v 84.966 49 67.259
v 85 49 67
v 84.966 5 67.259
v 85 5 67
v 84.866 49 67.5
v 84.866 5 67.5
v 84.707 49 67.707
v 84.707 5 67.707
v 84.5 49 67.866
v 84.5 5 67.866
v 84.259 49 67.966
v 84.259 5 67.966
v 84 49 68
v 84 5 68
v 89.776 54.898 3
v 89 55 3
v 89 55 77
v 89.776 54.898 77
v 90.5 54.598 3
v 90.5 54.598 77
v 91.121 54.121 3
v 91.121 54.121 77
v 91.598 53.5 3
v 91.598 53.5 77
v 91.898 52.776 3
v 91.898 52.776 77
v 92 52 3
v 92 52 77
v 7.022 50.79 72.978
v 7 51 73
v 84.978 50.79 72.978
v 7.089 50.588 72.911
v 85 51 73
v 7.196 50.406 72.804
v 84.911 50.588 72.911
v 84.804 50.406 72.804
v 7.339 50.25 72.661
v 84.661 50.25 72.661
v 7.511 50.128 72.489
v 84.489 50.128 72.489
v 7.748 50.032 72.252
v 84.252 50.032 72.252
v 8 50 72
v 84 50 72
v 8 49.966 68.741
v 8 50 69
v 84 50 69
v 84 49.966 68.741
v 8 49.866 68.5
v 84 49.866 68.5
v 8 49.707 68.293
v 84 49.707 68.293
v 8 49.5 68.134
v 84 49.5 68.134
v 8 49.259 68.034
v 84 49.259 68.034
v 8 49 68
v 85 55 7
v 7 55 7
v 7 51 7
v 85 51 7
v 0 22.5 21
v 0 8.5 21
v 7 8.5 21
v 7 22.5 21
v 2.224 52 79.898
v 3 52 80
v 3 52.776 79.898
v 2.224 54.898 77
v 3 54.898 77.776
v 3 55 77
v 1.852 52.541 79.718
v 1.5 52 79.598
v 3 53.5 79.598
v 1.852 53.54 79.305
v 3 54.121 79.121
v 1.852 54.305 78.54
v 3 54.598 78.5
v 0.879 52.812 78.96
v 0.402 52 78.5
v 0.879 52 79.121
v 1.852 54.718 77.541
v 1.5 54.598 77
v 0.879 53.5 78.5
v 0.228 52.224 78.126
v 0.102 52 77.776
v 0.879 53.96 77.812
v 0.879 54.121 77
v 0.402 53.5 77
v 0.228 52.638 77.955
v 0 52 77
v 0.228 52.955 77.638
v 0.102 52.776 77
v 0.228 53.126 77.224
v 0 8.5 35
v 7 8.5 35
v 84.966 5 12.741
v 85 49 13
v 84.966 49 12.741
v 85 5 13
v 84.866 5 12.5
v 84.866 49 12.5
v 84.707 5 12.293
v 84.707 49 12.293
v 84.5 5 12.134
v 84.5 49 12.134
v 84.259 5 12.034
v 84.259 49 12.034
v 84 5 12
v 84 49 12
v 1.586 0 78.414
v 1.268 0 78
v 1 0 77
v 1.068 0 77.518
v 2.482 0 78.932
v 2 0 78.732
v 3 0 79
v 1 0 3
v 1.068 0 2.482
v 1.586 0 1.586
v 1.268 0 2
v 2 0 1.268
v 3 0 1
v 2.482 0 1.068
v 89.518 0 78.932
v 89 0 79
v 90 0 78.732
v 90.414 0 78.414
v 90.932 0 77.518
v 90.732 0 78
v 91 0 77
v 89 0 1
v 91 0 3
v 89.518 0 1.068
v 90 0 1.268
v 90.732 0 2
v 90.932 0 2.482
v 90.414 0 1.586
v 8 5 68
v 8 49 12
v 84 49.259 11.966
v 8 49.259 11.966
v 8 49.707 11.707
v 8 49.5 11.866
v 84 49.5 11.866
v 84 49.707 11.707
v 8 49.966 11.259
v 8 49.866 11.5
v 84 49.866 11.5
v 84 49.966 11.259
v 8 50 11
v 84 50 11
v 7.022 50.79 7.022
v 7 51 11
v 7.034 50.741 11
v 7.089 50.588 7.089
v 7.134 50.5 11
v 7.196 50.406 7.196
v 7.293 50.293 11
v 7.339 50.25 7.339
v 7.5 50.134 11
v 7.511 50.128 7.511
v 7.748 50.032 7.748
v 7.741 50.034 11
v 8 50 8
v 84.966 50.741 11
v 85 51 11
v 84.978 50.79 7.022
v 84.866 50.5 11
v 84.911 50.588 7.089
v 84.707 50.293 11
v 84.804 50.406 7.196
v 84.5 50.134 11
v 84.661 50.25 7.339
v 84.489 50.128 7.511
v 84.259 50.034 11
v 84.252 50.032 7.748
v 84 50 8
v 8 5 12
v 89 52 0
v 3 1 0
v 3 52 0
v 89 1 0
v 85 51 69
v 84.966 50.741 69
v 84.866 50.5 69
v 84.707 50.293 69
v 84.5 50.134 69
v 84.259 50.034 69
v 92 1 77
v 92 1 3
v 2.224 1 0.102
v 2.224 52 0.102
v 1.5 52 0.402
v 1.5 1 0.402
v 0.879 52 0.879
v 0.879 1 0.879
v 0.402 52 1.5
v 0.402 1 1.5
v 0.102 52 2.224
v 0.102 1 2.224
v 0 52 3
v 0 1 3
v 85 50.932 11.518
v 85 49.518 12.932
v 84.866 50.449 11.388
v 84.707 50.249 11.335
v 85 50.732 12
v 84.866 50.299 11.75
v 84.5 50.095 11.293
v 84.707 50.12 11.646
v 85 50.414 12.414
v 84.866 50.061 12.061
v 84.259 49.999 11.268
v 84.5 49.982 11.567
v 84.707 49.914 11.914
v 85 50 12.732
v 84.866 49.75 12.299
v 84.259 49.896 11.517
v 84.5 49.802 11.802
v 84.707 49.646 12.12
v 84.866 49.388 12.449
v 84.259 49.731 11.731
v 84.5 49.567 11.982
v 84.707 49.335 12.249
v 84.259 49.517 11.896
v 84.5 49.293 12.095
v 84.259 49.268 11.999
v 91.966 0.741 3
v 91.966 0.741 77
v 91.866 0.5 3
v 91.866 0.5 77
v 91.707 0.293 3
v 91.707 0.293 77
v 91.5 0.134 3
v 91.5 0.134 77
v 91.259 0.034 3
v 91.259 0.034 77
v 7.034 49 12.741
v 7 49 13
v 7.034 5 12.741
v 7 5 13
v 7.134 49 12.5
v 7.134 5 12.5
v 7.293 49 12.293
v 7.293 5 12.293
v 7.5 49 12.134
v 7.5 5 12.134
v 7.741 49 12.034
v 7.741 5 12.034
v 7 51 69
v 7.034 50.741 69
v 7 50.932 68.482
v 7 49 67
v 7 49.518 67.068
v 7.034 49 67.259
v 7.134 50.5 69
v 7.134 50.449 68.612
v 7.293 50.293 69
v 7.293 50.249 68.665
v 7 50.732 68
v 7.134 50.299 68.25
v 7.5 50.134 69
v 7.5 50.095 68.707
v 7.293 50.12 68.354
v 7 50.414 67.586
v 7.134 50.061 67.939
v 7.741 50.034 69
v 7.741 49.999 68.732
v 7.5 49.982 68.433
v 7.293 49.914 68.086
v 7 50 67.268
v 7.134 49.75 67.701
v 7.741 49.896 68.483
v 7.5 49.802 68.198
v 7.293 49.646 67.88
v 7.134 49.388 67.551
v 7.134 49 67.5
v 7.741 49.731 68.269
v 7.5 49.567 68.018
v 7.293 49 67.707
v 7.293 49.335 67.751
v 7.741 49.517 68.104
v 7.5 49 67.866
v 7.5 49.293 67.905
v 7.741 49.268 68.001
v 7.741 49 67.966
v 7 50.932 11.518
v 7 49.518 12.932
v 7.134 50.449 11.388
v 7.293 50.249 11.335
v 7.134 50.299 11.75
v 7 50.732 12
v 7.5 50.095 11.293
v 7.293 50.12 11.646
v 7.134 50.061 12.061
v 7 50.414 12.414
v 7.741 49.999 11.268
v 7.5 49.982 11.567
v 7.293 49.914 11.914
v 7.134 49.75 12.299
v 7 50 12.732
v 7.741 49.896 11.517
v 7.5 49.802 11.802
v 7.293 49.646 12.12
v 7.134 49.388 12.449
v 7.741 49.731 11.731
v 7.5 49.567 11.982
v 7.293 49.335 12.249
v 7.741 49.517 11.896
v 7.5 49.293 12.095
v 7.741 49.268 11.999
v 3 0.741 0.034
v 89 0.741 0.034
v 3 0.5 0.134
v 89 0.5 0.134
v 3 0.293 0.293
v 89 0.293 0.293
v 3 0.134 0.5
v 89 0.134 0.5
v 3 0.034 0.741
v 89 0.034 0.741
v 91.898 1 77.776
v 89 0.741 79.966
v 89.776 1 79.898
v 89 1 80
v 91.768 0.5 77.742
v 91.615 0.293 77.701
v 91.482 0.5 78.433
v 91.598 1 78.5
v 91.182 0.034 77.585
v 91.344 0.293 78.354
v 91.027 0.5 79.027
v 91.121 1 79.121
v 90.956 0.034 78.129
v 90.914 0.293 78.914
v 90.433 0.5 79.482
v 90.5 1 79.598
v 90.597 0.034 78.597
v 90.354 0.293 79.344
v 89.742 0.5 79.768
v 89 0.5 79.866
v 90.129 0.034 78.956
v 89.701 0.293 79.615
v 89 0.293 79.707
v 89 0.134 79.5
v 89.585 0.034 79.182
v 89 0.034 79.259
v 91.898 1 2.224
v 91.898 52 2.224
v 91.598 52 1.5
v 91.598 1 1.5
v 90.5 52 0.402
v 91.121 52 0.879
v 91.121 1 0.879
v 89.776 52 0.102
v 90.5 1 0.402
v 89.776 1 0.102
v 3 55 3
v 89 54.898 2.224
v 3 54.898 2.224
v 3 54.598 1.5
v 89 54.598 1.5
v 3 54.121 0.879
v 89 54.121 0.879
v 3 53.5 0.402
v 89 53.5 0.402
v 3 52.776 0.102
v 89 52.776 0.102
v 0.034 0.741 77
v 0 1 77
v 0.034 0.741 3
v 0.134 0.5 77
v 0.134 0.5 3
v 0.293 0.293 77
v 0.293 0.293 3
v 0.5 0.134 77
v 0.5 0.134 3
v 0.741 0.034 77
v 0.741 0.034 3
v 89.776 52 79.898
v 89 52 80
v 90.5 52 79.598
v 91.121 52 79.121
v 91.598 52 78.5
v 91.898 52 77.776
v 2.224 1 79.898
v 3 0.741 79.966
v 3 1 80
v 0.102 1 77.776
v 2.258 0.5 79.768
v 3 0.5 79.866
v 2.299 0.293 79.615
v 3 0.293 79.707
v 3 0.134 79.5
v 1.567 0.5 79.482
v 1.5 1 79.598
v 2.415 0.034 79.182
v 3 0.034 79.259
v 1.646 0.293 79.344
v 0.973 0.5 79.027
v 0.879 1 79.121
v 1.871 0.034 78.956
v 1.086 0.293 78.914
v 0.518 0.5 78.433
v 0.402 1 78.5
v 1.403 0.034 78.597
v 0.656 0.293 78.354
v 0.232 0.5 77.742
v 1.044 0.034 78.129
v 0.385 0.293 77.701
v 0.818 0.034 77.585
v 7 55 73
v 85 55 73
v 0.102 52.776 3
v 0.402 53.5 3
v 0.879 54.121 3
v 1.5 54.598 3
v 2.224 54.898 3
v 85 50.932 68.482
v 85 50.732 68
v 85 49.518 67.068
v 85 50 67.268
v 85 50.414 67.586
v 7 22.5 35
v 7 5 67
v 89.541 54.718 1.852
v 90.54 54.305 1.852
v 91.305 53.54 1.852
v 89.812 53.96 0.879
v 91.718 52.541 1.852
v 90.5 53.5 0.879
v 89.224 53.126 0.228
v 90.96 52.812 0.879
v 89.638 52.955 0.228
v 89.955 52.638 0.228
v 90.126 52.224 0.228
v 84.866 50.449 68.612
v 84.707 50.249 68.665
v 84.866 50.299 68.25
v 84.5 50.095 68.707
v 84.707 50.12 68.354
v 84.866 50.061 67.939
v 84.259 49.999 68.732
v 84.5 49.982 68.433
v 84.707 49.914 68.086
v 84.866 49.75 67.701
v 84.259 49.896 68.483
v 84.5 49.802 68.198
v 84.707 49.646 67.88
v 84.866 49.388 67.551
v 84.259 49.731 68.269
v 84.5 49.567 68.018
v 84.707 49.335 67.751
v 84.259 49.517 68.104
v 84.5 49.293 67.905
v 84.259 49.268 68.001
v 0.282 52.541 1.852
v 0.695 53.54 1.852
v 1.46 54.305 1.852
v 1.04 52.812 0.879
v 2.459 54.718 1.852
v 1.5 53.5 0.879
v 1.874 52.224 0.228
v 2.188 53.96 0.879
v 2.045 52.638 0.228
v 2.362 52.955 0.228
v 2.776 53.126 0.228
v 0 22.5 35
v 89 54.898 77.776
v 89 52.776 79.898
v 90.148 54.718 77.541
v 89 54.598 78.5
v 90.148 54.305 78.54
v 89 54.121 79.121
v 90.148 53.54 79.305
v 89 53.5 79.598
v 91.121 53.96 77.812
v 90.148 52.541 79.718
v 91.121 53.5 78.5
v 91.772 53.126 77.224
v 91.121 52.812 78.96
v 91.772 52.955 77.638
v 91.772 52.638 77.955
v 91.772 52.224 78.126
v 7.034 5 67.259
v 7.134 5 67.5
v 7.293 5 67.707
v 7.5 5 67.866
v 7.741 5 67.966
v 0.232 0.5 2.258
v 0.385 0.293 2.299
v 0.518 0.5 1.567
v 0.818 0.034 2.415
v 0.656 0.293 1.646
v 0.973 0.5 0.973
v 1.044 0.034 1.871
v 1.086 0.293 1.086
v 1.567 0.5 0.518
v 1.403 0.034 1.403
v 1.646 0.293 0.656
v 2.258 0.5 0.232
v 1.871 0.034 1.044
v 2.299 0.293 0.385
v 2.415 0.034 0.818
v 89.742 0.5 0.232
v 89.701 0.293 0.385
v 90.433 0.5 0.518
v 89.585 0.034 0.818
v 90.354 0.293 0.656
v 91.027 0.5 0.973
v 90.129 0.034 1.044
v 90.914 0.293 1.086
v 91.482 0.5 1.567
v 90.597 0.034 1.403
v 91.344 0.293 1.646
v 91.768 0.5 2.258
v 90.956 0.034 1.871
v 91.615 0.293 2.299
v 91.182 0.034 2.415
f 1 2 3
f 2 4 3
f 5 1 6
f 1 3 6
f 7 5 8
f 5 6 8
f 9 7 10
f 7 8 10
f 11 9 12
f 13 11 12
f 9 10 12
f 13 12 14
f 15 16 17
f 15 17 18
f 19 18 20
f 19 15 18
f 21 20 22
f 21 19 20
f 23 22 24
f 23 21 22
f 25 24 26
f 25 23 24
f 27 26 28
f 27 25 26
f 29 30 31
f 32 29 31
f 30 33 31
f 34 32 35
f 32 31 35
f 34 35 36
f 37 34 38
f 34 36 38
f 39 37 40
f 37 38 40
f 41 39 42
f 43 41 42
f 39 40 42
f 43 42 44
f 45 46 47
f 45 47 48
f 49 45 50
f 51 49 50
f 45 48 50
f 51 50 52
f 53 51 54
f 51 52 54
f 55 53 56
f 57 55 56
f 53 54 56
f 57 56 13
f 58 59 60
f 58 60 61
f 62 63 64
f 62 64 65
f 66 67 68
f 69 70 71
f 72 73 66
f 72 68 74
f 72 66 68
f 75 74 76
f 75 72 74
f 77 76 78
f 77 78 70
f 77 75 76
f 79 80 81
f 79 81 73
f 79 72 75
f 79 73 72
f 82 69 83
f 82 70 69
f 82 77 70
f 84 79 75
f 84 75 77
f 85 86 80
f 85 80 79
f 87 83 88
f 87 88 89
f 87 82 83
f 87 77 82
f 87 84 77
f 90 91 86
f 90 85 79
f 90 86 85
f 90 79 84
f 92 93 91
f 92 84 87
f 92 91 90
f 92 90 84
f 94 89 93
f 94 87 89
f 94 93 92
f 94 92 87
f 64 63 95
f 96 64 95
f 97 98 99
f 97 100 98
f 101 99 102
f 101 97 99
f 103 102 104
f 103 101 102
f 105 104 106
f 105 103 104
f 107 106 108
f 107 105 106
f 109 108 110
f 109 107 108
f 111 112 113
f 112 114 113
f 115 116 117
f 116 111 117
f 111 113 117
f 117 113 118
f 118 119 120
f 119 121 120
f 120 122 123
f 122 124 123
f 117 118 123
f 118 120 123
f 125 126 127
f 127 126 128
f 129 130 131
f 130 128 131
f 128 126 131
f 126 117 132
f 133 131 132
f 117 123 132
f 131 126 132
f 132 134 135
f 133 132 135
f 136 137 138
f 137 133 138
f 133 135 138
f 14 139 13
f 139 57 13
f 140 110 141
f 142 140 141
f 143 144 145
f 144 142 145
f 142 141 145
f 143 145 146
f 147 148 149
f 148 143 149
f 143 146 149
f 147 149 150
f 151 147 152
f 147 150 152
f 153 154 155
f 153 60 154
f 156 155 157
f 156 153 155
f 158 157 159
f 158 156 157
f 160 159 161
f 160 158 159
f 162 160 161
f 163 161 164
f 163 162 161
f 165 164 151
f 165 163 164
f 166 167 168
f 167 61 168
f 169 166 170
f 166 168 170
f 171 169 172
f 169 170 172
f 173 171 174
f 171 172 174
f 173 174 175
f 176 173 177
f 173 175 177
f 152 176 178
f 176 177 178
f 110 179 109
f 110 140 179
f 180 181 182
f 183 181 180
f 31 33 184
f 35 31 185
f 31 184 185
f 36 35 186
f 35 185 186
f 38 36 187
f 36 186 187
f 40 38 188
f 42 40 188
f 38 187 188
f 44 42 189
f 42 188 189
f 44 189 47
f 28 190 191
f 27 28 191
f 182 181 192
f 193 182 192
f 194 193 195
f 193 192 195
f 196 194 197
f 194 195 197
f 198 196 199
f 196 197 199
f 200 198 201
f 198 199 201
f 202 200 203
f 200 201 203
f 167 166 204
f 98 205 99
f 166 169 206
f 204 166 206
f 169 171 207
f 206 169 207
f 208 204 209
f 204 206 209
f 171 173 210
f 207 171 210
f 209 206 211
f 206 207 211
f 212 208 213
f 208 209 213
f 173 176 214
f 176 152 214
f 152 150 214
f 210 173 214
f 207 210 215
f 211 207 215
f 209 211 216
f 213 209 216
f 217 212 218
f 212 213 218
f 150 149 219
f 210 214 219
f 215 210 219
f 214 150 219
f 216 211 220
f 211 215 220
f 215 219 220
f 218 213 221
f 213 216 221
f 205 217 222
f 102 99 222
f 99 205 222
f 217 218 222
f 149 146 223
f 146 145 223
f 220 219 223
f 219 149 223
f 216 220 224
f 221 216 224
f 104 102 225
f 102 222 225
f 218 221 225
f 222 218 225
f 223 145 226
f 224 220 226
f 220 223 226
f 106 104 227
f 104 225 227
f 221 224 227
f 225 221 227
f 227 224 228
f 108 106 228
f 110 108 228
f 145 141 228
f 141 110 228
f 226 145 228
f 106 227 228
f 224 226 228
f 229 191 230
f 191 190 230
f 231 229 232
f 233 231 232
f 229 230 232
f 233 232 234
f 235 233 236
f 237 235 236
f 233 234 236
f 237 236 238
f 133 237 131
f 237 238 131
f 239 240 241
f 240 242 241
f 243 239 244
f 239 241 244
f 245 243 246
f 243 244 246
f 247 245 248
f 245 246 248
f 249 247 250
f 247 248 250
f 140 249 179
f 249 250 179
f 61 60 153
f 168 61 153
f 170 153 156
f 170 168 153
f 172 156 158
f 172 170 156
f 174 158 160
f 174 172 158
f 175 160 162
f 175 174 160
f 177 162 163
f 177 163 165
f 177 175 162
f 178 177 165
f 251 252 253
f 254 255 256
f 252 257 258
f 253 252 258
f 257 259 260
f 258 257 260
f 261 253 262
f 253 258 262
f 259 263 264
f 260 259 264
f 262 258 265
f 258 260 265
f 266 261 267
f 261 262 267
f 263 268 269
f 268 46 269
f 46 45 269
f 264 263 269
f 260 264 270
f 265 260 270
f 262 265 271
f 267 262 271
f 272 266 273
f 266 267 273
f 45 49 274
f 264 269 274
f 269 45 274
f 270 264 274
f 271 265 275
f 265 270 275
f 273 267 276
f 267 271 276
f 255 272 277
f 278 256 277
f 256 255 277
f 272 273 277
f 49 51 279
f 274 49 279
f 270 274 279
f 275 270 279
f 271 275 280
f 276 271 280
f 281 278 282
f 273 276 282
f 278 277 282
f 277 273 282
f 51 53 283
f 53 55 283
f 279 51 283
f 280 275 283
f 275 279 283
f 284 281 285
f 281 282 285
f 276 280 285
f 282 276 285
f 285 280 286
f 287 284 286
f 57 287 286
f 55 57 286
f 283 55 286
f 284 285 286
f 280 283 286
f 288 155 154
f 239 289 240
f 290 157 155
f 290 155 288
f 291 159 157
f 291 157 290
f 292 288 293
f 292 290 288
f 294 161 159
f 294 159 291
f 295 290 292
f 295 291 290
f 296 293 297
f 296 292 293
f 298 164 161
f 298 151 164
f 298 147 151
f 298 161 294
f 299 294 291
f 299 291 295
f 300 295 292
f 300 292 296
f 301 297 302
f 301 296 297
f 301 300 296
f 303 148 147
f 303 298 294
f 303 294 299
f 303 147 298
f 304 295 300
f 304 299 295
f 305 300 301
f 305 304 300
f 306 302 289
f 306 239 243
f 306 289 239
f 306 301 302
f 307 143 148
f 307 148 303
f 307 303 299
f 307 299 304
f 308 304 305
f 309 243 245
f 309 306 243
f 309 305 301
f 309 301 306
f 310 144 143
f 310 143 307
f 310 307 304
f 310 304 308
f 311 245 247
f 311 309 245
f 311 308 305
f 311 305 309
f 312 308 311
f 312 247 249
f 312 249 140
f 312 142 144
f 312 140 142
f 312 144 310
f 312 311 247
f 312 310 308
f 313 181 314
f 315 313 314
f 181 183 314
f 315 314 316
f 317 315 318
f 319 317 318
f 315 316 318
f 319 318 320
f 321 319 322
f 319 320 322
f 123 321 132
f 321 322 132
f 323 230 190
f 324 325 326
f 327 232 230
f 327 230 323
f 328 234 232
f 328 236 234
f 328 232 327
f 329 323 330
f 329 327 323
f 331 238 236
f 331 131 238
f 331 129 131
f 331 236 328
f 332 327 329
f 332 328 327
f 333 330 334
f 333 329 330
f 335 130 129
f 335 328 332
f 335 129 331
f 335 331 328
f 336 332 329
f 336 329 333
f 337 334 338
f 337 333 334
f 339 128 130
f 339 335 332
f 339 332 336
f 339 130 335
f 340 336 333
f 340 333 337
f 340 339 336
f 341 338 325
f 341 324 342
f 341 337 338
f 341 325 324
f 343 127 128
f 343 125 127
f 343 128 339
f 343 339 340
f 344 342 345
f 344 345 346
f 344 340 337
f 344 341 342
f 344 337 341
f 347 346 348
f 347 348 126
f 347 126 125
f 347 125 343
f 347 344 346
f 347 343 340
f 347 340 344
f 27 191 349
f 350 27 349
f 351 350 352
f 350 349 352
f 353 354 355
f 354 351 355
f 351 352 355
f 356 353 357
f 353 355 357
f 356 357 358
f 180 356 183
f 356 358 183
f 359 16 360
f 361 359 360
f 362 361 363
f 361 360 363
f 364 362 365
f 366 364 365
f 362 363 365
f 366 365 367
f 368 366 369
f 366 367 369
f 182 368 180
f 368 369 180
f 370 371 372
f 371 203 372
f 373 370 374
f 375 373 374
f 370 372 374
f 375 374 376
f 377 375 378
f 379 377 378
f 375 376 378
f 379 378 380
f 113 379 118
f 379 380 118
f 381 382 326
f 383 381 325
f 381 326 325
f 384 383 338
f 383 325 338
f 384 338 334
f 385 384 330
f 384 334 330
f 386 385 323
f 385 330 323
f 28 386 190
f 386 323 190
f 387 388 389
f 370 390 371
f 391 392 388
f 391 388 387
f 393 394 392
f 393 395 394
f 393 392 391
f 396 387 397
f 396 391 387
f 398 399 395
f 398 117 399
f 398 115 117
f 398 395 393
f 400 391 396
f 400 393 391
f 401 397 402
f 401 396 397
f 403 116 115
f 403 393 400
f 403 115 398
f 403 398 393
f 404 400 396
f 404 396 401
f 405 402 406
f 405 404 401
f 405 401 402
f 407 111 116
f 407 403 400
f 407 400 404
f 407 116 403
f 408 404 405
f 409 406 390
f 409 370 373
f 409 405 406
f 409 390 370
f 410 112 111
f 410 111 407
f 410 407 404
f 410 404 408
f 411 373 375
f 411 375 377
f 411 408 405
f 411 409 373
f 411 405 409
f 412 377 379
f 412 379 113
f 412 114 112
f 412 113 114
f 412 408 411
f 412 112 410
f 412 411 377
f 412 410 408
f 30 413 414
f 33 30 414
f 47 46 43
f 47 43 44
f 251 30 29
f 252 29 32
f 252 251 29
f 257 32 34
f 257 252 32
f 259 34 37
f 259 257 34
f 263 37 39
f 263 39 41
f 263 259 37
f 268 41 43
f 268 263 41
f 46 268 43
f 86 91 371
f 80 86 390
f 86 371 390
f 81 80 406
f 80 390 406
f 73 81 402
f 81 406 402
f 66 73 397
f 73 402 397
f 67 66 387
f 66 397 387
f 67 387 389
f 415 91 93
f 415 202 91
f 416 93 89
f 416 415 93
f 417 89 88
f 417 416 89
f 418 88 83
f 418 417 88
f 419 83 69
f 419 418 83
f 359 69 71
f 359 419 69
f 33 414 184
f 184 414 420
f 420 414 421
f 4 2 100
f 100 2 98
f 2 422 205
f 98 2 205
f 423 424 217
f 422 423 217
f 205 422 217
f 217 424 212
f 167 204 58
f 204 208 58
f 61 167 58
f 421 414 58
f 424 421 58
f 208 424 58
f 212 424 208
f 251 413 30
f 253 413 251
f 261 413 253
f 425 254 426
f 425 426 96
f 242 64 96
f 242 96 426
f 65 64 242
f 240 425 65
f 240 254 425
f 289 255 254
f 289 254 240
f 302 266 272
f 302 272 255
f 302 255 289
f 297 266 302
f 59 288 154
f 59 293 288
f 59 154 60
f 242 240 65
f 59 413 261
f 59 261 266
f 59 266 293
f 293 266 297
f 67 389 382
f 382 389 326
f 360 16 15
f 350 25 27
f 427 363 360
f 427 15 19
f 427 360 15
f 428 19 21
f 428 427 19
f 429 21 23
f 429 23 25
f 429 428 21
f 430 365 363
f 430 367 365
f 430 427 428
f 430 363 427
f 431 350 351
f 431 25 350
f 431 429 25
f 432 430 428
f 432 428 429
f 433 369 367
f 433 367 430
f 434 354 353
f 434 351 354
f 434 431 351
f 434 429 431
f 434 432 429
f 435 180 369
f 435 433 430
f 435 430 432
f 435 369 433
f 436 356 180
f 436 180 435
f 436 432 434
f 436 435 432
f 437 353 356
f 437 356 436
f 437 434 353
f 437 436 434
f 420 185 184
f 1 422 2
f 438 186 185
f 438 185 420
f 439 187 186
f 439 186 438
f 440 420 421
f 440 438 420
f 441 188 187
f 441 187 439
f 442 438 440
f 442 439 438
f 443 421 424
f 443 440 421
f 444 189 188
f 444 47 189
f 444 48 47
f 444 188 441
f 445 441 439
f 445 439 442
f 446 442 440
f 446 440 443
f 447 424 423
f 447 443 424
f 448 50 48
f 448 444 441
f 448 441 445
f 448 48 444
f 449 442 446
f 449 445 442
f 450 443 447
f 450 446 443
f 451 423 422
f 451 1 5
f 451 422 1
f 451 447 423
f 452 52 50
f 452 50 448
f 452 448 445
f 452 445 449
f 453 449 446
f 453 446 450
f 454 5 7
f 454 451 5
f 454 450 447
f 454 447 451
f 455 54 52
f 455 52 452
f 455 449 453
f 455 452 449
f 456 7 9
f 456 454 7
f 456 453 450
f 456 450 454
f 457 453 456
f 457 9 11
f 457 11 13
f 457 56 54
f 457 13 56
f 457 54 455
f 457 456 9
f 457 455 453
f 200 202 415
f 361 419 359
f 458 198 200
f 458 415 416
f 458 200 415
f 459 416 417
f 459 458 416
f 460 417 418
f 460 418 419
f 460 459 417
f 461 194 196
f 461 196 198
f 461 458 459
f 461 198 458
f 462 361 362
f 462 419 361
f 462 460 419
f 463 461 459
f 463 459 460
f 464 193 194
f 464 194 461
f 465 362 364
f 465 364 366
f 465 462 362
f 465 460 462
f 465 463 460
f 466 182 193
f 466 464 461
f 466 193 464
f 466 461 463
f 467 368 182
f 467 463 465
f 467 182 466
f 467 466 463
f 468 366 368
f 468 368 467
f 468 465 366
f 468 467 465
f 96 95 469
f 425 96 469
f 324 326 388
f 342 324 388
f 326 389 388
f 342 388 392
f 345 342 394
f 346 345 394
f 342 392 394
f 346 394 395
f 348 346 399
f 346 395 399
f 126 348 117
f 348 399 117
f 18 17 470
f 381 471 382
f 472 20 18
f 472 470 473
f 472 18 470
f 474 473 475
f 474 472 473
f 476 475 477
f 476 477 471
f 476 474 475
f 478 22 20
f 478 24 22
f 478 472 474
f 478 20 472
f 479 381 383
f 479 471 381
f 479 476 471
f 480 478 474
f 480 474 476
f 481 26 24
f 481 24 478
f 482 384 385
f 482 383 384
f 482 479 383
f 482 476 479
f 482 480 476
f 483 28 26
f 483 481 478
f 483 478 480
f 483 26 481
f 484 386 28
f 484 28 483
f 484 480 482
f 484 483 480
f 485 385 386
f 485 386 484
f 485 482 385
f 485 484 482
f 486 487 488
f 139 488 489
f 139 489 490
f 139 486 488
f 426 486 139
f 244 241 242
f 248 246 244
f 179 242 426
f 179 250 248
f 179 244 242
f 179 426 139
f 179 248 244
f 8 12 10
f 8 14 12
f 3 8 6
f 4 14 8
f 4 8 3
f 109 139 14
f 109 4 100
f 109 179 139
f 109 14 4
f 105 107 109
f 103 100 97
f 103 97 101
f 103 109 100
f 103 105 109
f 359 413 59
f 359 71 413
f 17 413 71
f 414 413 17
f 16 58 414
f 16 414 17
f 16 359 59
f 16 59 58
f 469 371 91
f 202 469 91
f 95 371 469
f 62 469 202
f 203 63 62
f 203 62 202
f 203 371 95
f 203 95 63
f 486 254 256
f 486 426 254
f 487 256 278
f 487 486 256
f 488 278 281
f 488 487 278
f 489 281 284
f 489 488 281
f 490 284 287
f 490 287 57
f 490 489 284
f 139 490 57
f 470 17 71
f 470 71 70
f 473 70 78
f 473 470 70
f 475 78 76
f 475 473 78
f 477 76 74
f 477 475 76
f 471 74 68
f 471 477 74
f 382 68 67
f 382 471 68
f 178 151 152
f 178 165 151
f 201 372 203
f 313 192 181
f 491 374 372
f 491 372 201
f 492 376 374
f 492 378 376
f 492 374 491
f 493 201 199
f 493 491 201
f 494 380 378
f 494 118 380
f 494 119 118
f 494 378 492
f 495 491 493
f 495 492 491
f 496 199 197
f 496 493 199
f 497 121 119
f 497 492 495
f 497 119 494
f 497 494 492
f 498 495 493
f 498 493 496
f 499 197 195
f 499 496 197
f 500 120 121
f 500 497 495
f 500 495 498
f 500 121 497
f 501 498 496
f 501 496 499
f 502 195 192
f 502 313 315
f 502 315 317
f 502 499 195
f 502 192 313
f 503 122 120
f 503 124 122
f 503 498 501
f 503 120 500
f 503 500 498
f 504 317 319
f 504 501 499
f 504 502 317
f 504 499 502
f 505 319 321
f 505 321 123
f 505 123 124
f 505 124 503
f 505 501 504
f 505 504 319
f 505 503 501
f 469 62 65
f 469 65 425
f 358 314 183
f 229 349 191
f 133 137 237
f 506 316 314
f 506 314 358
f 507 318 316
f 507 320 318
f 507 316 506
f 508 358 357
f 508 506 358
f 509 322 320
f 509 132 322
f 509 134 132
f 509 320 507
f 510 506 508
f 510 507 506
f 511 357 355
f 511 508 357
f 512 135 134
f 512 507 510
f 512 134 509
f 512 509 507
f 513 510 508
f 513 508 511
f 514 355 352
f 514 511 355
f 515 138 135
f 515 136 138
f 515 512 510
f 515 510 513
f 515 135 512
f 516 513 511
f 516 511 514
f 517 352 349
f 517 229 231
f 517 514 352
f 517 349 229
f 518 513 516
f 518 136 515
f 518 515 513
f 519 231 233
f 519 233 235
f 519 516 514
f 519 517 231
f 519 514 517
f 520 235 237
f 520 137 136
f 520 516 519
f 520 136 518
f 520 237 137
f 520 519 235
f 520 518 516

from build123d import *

# Parameters (mm, degrees)
SKETCH1_W           = 92
SKETCH1_H           = 80
BOSS_EXTRUDE1_DEPTH = 55
SKETCH2_W           = 78
SKETCH2_H           = 56
CUT_EXTRUDE1_DEPTH  = 50
SKETCH3_W           = 78
SKETCH3_H           = 5
CUT_EXTRUDE2_DEPTH  = 5
FILLET_TOP_R        = 3
FILLET_EDGES_R      = 3
FILLET_BOTTOM_R     = 1
FILLET4_R           = 1
CUT_EXTRUDE4_REACH  = 135.75
SKETCH5_W           = 14
SKETCH5_H           = 14


with BuildPart() as part:
    # Sketch1 → Boss-Extrude1 (new body)
    with BuildSketch(Plane(origin=(0, 0, 0), x_dir=(1, 0, 0), z_dir=(0, 1, 0))):
        with Locations((46, -40)):
            Rectangle(SKETCH1_W, SKETCH1_H)
    extrude(amount=BOSS_EXTRUDE1_DEPTH)

    # Sketch2 → Cut-Extrude1 (cut)
    with BuildSketch(Plane(origin=(0, 55, 0), x_dir=(1, 0, 0), z_dir=(0, 1, 0))):
        with Locations((46, -40)):
            Rectangle(SKETCH2_W, SKETCH2_H)
    extrude(amount=-CUT_EXTRUDE1_DEPTH, mode=Mode.SUBTRACT)

    # Sketch3 → Cut-Extrude2 (cut)
    with BuildSketch(Plane(origin=(0, 55, 0), x_dir=(1, 0, 0), z_dir=(0, 1, 0))):
        with Locations((46, -9.5)):
            Rectangle(SKETCH3_W, SKETCH3_H)
        with Locations((46, -70.5)):
            Rectangle(SKETCH3_W, SKETCH3_H)
    extrude(amount=-CUT_EXTRUDE2_DEPTH, mode=Mode.SUBTRACT)

    # Fillet_top
    fillet_top_edges = [part.edges().sort_by_distance(p)[0] for p in [
        (92, 55, 40),
        (46, 55, 0),
        (0, 55, 40),
        (46, 55, 80),
    ]]
    fillet(fillet_top_edges, radius=FILLET_TOP_R)

    # Fillet_edges
    # the kernel refuses this fillet: 3 mm, written as the material it takes off along each edge
    with BuildSketch(Plane(origin=(3, 52, 77), x_dir=(0, 0, 1), z_dir=(-1, 0, 0))) as fillet_edges_piece_1_section:
        Polygon((0, 0), (FILLET_EDGES_R, 0), (FILLET_EDGES_R, FILLET_EDGES_R), (0, FILLET_EDGES_R), align=None)
    fillet_edges_piece_1 = extrude(amount=FILLET_EDGES_R, mode=Mode.PRIVATE)
    fillet_edges_piece_1 = fillet_edges_piece_1 - Plane(origin=(3, 52, 77), x_dir=(0, -0.7071067811865475, -0.7071067811865475), z_dir=(-1, 0, 0)) * Sphere(FILLET_EDGES_R, mode=Mode.PRIVATE)
    add(fillet_edges_piece_1, mode=Mode.SUBTRACT)
    with BuildSketch(Plane(origin=(3, 52, 3), x_dir=(-1, 0, 0), z_dir=(0, 0, -1))) as fillet_edges_piece_2_section:
        Polygon((0, 0), (FILLET_EDGES_R, 0), (FILLET_EDGES_R, FILLET_EDGES_R), (0, FILLET_EDGES_R), align=None)
    fillet_edges_piece_2 = extrude(amount=FILLET_EDGES_R, mode=Mode.PRIVATE)
    fillet_edges_piece_2 = fillet_edges_piece_2 - Plane(origin=(3, 52, 3), x_dir=(0.7071067811865475, -0.7071067811865475, 0), z_dir=(0, 0, -1)) * Sphere(FILLET_EDGES_R, mode=Mode.PRIVATE)
    add(fillet_edges_piece_2, mode=Mode.SUBTRACT)
    with BuildSketch(Plane(origin=(89, 52, 77), x_dir=(0, 0, 1), z_dir=(1, 0, 0))) as fillet_edges_piece_3_section:
        Polygon((0, 0), (FILLET_EDGES_R, 0), (FILLET_EDGES_R, -FILLET_EDGES_R), (0, -FILLET_EDGES_R), align=None)
    fillet_edges_piece_3 = extrude(amount=FILLET_EDGES_R, mode=Mode.PRIVATE)
    fillet_edges_piece_3 = fillet_edges_piece_3 - Plane(origin=(89, 52, 77), x_dir=(0, -0.7071067811865475, -0.7071067811865475), z_dir=(1, 0, 0)) * Sphere(FILLET_EDGES_R, mode=Mode.PRIVATE)
    add(fillet_edges_piece_3, mode=Mode.SUBTRACT)
    with BuildSketch(Plane(origin=(89, 52, 3), x_dir=(1, 0, 0), z_dir=(0, 0, -1))) as fillet_edges_piece_4_section:
        Polygon((0, 0), (FILLET_EDGES_R, 0), (FILLET_EDGES_R, -FILLET_EDGES_R), (0, -FILLET_EDGES_R), align=None)
    fillet_edges_piece_4 = extrude(amount=FILLET_EDGES_R, mode=Mode.PRIVATE)
    fillet_edges_piece_4 = fillet_edges_piece_4 - Plane(origin=(89, 52, 3), x_dir=(-0.7071067811865475, -0.7071067811865475, 0), z_dir=(0, 0, -1)) * Sphere(FILLET_EDGES_R, mode=Mode.PRIVATE)
    add(fillet_edges_piece_4, mode=Mode.SUBTRACT)
    with BuildSketch(Plane(origin=(92, -7.5, 0), x_dir=(-1, 0, 0), z_dir=(0, 1, 0)), Plane(origin=(92, -7.5, 80), x_dir=(0, 0, -1), z_dir=(0, 1, 0))) as fillet_edges_piece_5:
        with BuildLine():
            CenterArc((FILLET_EDGES_R, FILLET_EDGES_R), FILLET_EDGES_R, 180, 90)
            Line((0, FILLET_EDGES_R), (0, 0))
            Line((0, 0), (FILLET_EDGES_R, 0))
        make_face()
    extrude(amount=59.5, mode=Mode.SUBTRACT)
    with BuildSketch(Plane(origin=(0, -7.5, 80), x_dir=(0, 0, -1), z_dir=(0, 1, 0)), Plane(origin=(0, -7.5, 0), x_dir=(1, 0, 0), z_dir=(0, 1, 0))) as fillet_edges_piece_6:
        with BuildLine():
            CenterArc((FILLET_EDGES_R, -FILLET_EDGES_R), FILLET_EDGES_R, 90, 90)
            Line((0, -FILLET_EDGES_R), (0, 0))
            Line((0, 0), (FILLET_EDGES_R, 0))
        make_face()
    extrude(amount=59.5, mode=Mode.SUBTRACT)

    # Fillet_bottom
    fillet_bottom_edges = [part.edges().sort_by_distance(p)[0] for p in [
        (0, 0, 40),
        (46, 0, 0),
        (92, 0, 40),
        (46, 0, 80),
        (0.878679656, 0, 79.121320344),
        (91.121320344, 0, 79.121320344),
        (91.121320344, 0, 0.878679656),
        (0.878679656, 0, 0.878679656),
    ]]
    fillet(fillet_bottom_edges, radius=FILLET_BOTTOM_R)

    # Fillet4
    fillet4_edges = [part.edges().sort_by_distance(p)[0] for p in [
        (7, 27.5, 68),
        (7, 27.5, 12),
        (85, 27.5, 12),
        (85, 27.5, 68),
        (46, 50, 12),
        (7, 50, 9.5),
        (46, 50, 7),
        (85, 50, 9.5),
        (46, 50, 68),
        (85, 50, 70.5),
        (46, 50, 73),
        (7, 50, 70.5),
    ]]
    fillet(fillet4_edges, radius=FILLET4_R)

    # Sketch5 → Cut-Extrude4 (cut, up to next)
    with BuildSketch(Plane.ZY, mode=Mode.PRIVATE) as cut_extrude4_sk1:
        with Locations((28, 15.5)):
            Rectangle(SKETCH5_W, SKETCH5_H)
    cut_extrude4_tool1 = extrude(cut_extrude4_sk1.sketch, amount=-CUT_EXTRUDE4_REACH, mode=Mode.PRIVATE) & part.part
    add(cut_extrude4_tool1.solids().sort_by_distance((0, 15.5, 28))[0], mode=Mode.SUBTRACT)


solid = part.part
